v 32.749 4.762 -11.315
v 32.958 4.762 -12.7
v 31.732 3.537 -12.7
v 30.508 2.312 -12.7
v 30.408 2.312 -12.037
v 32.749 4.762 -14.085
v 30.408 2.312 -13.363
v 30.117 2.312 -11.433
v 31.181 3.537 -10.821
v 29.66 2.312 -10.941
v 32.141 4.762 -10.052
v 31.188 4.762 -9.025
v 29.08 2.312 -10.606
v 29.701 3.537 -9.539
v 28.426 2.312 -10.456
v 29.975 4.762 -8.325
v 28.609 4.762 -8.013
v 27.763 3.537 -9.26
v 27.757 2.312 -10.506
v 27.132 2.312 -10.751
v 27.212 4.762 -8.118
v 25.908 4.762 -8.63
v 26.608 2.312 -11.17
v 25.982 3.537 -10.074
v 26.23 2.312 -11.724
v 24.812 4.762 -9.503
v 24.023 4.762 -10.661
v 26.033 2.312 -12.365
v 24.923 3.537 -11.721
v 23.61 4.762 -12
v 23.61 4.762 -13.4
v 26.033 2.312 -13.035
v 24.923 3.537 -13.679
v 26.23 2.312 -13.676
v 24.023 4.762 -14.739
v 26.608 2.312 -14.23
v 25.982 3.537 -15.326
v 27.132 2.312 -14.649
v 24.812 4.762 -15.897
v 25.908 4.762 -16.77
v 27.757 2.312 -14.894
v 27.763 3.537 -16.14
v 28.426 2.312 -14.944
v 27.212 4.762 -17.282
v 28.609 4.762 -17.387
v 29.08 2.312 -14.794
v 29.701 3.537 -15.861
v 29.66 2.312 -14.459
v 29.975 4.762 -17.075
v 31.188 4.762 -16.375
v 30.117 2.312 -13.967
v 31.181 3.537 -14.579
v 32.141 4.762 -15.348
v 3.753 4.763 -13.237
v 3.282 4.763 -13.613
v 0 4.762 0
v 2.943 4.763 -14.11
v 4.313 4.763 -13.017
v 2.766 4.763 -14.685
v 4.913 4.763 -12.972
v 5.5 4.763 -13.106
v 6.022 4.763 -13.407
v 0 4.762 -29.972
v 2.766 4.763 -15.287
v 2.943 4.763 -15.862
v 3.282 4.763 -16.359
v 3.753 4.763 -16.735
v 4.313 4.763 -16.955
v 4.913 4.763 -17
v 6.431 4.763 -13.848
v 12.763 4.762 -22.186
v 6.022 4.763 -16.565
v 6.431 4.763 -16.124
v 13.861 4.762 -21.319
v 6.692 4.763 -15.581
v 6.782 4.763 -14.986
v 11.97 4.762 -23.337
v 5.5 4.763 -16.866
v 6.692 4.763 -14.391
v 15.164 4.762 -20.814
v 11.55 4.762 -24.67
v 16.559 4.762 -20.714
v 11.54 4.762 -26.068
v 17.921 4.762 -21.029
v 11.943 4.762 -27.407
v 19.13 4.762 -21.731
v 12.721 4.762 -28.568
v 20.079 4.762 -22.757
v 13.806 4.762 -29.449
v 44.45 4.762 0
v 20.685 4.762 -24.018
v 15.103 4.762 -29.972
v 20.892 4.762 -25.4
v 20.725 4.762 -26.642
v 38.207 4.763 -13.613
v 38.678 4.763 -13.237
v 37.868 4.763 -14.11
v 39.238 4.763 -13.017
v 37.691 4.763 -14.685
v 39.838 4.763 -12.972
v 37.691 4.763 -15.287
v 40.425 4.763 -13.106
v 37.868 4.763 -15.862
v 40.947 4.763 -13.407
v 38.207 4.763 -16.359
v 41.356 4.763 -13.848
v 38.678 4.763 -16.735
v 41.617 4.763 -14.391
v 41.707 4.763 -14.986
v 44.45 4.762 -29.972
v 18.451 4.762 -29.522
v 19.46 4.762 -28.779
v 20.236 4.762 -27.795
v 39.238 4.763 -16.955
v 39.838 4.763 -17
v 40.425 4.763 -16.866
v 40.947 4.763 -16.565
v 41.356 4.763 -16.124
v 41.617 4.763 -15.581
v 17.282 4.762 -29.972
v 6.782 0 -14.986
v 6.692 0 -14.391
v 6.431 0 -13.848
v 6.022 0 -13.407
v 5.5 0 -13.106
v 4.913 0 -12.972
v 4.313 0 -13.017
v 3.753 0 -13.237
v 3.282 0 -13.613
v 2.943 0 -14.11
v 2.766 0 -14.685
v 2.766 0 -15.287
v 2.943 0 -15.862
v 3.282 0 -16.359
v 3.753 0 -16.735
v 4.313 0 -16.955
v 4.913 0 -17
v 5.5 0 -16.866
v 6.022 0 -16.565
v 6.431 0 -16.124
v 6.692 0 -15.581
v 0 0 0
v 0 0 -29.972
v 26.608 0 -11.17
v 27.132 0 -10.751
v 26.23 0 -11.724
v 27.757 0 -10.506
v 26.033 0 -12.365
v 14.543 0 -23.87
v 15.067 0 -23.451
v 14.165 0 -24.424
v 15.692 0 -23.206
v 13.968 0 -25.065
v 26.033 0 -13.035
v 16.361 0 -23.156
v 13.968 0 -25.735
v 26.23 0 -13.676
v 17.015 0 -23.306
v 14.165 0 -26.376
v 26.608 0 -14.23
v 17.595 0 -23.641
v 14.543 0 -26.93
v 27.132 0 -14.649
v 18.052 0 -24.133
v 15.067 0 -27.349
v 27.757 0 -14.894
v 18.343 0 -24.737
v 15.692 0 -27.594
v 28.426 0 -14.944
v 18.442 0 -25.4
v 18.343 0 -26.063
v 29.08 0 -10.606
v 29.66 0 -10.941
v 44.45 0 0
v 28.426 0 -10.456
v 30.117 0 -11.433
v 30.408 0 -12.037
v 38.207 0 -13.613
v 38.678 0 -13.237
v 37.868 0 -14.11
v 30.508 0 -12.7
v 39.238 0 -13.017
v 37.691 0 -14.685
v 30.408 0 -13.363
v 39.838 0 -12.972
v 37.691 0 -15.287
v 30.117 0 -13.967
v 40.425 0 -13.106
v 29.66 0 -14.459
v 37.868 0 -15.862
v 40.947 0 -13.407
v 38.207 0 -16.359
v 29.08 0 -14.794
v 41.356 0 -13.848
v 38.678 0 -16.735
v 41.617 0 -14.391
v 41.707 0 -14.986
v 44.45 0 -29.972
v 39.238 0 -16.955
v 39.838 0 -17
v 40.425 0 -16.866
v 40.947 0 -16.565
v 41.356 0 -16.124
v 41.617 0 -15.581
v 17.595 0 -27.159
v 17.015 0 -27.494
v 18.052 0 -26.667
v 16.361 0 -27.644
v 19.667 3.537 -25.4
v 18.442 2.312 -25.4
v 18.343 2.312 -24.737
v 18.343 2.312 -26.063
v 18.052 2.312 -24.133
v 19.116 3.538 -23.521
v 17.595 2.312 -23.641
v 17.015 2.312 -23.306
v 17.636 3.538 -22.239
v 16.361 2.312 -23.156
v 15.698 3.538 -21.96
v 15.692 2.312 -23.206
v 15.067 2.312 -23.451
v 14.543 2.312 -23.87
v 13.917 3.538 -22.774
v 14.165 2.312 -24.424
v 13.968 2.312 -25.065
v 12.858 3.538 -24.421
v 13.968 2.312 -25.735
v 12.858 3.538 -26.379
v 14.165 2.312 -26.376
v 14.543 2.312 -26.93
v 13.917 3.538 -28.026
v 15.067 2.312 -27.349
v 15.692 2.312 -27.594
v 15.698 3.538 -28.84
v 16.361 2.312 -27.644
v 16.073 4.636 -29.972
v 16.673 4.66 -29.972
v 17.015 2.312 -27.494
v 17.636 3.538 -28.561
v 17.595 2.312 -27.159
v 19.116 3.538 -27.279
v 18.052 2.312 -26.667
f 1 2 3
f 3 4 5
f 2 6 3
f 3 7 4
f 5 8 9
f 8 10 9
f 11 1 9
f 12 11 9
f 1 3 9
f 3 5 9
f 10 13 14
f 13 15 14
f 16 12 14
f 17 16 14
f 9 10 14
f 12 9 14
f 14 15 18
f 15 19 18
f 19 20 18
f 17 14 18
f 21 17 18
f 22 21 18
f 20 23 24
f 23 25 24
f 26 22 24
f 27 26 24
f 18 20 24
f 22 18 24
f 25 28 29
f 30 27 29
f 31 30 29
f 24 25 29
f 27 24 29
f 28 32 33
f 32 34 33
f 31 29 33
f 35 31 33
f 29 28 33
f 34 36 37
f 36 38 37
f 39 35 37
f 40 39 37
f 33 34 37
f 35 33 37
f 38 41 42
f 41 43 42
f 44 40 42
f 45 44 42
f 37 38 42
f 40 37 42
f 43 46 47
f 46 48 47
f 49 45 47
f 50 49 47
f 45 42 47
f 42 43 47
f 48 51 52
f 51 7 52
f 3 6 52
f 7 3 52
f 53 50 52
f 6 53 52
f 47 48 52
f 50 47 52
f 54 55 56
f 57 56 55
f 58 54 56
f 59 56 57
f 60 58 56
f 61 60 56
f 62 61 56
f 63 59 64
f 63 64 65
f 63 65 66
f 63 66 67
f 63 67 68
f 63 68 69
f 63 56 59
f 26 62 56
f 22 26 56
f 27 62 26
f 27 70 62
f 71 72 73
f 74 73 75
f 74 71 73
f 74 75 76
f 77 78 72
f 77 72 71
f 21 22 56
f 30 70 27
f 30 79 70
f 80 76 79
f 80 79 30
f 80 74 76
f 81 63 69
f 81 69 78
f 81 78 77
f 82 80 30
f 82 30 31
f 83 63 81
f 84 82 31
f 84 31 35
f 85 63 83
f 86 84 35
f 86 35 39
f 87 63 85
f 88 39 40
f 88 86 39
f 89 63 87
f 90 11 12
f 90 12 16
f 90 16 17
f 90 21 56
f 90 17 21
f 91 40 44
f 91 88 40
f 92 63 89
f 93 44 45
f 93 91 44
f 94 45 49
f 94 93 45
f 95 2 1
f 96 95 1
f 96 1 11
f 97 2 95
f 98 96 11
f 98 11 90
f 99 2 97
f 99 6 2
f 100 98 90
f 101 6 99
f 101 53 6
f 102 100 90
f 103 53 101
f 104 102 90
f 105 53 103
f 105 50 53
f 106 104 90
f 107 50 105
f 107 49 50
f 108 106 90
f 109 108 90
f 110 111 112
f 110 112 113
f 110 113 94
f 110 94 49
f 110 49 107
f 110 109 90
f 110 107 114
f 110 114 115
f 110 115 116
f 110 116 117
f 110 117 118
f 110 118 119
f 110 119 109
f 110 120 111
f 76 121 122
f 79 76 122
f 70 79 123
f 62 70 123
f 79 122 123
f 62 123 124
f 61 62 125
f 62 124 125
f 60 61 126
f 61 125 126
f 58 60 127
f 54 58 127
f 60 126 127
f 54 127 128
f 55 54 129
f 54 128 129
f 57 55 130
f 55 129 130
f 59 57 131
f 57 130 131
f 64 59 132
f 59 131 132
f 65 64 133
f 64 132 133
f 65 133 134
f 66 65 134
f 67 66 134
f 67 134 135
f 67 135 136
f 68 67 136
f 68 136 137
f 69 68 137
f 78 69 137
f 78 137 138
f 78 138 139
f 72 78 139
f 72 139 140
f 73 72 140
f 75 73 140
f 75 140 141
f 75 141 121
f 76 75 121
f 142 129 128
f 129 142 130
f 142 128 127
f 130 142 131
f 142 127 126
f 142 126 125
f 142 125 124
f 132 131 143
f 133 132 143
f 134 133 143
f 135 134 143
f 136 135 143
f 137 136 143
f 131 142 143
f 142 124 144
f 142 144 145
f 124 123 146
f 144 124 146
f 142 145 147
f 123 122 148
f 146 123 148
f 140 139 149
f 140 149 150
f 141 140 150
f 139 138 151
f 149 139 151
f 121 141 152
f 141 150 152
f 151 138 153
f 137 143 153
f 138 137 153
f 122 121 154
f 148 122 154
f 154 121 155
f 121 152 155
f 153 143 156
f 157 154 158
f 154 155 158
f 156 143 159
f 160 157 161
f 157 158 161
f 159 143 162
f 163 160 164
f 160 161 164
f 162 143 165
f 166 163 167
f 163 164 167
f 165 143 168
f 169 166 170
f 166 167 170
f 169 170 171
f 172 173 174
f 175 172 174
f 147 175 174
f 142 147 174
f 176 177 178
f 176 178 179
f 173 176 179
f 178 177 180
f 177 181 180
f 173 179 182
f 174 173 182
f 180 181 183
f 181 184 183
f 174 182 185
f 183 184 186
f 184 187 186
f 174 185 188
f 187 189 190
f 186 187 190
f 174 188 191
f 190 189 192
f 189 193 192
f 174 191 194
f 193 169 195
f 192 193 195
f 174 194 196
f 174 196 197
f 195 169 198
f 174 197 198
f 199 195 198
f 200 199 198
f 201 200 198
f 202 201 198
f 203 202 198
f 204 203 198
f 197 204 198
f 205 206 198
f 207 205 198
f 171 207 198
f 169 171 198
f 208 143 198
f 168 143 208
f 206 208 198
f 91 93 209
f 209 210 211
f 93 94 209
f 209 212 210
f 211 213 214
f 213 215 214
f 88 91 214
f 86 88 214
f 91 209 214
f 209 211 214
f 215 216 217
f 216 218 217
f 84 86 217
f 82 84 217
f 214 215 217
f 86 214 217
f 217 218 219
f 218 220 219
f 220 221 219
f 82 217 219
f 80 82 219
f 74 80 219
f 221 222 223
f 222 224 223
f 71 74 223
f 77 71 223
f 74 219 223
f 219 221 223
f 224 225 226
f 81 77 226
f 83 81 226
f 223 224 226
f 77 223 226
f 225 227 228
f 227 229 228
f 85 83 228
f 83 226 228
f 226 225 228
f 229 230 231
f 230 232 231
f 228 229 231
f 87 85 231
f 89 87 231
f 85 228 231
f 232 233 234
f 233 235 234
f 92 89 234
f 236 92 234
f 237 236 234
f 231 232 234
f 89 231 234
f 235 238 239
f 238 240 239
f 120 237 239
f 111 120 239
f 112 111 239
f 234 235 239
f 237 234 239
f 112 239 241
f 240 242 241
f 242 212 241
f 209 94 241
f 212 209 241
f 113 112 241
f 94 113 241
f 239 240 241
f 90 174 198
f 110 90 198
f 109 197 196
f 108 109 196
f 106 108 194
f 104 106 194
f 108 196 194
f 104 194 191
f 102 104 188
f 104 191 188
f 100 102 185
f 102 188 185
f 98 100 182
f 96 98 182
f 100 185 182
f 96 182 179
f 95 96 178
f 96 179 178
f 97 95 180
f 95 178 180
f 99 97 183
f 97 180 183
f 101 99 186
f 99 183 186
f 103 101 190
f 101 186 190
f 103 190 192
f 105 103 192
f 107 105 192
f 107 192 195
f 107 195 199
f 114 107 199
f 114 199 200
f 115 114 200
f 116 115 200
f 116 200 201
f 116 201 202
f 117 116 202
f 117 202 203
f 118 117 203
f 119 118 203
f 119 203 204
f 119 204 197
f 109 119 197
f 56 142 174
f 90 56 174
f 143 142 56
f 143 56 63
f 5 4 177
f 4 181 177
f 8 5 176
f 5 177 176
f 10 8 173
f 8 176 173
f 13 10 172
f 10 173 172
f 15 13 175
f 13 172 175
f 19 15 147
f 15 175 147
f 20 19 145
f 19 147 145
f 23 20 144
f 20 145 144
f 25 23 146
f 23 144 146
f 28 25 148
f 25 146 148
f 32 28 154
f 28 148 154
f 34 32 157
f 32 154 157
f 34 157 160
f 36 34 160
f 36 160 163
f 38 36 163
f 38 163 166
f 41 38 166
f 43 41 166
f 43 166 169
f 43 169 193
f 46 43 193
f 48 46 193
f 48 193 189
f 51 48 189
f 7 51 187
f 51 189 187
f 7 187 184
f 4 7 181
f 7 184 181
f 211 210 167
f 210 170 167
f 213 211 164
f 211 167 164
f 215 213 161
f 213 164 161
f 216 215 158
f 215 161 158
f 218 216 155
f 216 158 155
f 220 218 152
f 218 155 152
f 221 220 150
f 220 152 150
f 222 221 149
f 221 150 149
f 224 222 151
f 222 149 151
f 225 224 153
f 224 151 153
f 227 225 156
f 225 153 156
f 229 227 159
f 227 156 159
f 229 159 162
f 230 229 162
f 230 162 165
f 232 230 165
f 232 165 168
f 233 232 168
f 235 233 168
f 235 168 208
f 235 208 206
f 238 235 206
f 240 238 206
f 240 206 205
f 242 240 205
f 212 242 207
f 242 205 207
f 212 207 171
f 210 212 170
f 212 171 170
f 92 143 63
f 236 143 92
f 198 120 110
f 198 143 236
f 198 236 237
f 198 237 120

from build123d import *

# Parameters (mm, degrees)
SKETCH1_W                                       = 44.45
SKETCH1_H                                       = 29.972
EXTRUDE1_DEPTH                                  = 4.7625
F_10_32_TAPPED_HOLE1_D                          = 4.0386
CSK_FOR_M4_FLAT_HEAD_MACHINE_SCREW1_D           = 4.5
CSK_FOR_M4_FLAT_HEAD_MACHINE_SCREW1_CSINK_D     = 9.4
CSK_FOR_M4_FLAT_HEAD_MACHINE_SCREW1_CSINK_ANGLE = 90


with BuildPart() as part:
    # Sketch1 → Extrude1 (new body)
    with BuildSketch(Plane(origin=(0, 0, 0), x_dir=(1, 0, 0), z_dir=(0, 1, 0))):
        with Locations((22.225, 14.986)):
            Rectangle(SKETCH1_W, SKETCH1_H)
    extrude(amount=EXTRUDE1_DEPTH)

    # #10-32 Tapped Hole1 (through all)
    with Locations(Plane(origin=(0, 4.7625, 0), x_dir=(-1, 0, 0), z_dir=(0, 1, 0))):
        with Locations((-4.7625, -14.986), (-39.6875, -14.986)):
            Hole(F_10_32_TAPPED_HOLE1_D / 2)

    # CSK for M4 Flat Head Machine Screw1 (through all)
    with Locations(Plane(origin=(0, 4.7625, 0), x_dir=(-1, 0, 0), z_dir=(0, 1, 0))):
        with Locations((-28.2575, -12.7), (-16.1925, -25.4)):
            CounterSinkHole(CSK_FOR_M4_FLAT_HEAD_MACHINE_SCREW1_D / 2, CSK_FOR_M4_FLAT_HEAD_MACHINE_SCREW1_CSINK_D / 2, counter_sink_angle=CSK_FOR_M4_FLAT_HEAD_MACHINE_SCREW1_CSINK_ANGLE)


solid = part.part
